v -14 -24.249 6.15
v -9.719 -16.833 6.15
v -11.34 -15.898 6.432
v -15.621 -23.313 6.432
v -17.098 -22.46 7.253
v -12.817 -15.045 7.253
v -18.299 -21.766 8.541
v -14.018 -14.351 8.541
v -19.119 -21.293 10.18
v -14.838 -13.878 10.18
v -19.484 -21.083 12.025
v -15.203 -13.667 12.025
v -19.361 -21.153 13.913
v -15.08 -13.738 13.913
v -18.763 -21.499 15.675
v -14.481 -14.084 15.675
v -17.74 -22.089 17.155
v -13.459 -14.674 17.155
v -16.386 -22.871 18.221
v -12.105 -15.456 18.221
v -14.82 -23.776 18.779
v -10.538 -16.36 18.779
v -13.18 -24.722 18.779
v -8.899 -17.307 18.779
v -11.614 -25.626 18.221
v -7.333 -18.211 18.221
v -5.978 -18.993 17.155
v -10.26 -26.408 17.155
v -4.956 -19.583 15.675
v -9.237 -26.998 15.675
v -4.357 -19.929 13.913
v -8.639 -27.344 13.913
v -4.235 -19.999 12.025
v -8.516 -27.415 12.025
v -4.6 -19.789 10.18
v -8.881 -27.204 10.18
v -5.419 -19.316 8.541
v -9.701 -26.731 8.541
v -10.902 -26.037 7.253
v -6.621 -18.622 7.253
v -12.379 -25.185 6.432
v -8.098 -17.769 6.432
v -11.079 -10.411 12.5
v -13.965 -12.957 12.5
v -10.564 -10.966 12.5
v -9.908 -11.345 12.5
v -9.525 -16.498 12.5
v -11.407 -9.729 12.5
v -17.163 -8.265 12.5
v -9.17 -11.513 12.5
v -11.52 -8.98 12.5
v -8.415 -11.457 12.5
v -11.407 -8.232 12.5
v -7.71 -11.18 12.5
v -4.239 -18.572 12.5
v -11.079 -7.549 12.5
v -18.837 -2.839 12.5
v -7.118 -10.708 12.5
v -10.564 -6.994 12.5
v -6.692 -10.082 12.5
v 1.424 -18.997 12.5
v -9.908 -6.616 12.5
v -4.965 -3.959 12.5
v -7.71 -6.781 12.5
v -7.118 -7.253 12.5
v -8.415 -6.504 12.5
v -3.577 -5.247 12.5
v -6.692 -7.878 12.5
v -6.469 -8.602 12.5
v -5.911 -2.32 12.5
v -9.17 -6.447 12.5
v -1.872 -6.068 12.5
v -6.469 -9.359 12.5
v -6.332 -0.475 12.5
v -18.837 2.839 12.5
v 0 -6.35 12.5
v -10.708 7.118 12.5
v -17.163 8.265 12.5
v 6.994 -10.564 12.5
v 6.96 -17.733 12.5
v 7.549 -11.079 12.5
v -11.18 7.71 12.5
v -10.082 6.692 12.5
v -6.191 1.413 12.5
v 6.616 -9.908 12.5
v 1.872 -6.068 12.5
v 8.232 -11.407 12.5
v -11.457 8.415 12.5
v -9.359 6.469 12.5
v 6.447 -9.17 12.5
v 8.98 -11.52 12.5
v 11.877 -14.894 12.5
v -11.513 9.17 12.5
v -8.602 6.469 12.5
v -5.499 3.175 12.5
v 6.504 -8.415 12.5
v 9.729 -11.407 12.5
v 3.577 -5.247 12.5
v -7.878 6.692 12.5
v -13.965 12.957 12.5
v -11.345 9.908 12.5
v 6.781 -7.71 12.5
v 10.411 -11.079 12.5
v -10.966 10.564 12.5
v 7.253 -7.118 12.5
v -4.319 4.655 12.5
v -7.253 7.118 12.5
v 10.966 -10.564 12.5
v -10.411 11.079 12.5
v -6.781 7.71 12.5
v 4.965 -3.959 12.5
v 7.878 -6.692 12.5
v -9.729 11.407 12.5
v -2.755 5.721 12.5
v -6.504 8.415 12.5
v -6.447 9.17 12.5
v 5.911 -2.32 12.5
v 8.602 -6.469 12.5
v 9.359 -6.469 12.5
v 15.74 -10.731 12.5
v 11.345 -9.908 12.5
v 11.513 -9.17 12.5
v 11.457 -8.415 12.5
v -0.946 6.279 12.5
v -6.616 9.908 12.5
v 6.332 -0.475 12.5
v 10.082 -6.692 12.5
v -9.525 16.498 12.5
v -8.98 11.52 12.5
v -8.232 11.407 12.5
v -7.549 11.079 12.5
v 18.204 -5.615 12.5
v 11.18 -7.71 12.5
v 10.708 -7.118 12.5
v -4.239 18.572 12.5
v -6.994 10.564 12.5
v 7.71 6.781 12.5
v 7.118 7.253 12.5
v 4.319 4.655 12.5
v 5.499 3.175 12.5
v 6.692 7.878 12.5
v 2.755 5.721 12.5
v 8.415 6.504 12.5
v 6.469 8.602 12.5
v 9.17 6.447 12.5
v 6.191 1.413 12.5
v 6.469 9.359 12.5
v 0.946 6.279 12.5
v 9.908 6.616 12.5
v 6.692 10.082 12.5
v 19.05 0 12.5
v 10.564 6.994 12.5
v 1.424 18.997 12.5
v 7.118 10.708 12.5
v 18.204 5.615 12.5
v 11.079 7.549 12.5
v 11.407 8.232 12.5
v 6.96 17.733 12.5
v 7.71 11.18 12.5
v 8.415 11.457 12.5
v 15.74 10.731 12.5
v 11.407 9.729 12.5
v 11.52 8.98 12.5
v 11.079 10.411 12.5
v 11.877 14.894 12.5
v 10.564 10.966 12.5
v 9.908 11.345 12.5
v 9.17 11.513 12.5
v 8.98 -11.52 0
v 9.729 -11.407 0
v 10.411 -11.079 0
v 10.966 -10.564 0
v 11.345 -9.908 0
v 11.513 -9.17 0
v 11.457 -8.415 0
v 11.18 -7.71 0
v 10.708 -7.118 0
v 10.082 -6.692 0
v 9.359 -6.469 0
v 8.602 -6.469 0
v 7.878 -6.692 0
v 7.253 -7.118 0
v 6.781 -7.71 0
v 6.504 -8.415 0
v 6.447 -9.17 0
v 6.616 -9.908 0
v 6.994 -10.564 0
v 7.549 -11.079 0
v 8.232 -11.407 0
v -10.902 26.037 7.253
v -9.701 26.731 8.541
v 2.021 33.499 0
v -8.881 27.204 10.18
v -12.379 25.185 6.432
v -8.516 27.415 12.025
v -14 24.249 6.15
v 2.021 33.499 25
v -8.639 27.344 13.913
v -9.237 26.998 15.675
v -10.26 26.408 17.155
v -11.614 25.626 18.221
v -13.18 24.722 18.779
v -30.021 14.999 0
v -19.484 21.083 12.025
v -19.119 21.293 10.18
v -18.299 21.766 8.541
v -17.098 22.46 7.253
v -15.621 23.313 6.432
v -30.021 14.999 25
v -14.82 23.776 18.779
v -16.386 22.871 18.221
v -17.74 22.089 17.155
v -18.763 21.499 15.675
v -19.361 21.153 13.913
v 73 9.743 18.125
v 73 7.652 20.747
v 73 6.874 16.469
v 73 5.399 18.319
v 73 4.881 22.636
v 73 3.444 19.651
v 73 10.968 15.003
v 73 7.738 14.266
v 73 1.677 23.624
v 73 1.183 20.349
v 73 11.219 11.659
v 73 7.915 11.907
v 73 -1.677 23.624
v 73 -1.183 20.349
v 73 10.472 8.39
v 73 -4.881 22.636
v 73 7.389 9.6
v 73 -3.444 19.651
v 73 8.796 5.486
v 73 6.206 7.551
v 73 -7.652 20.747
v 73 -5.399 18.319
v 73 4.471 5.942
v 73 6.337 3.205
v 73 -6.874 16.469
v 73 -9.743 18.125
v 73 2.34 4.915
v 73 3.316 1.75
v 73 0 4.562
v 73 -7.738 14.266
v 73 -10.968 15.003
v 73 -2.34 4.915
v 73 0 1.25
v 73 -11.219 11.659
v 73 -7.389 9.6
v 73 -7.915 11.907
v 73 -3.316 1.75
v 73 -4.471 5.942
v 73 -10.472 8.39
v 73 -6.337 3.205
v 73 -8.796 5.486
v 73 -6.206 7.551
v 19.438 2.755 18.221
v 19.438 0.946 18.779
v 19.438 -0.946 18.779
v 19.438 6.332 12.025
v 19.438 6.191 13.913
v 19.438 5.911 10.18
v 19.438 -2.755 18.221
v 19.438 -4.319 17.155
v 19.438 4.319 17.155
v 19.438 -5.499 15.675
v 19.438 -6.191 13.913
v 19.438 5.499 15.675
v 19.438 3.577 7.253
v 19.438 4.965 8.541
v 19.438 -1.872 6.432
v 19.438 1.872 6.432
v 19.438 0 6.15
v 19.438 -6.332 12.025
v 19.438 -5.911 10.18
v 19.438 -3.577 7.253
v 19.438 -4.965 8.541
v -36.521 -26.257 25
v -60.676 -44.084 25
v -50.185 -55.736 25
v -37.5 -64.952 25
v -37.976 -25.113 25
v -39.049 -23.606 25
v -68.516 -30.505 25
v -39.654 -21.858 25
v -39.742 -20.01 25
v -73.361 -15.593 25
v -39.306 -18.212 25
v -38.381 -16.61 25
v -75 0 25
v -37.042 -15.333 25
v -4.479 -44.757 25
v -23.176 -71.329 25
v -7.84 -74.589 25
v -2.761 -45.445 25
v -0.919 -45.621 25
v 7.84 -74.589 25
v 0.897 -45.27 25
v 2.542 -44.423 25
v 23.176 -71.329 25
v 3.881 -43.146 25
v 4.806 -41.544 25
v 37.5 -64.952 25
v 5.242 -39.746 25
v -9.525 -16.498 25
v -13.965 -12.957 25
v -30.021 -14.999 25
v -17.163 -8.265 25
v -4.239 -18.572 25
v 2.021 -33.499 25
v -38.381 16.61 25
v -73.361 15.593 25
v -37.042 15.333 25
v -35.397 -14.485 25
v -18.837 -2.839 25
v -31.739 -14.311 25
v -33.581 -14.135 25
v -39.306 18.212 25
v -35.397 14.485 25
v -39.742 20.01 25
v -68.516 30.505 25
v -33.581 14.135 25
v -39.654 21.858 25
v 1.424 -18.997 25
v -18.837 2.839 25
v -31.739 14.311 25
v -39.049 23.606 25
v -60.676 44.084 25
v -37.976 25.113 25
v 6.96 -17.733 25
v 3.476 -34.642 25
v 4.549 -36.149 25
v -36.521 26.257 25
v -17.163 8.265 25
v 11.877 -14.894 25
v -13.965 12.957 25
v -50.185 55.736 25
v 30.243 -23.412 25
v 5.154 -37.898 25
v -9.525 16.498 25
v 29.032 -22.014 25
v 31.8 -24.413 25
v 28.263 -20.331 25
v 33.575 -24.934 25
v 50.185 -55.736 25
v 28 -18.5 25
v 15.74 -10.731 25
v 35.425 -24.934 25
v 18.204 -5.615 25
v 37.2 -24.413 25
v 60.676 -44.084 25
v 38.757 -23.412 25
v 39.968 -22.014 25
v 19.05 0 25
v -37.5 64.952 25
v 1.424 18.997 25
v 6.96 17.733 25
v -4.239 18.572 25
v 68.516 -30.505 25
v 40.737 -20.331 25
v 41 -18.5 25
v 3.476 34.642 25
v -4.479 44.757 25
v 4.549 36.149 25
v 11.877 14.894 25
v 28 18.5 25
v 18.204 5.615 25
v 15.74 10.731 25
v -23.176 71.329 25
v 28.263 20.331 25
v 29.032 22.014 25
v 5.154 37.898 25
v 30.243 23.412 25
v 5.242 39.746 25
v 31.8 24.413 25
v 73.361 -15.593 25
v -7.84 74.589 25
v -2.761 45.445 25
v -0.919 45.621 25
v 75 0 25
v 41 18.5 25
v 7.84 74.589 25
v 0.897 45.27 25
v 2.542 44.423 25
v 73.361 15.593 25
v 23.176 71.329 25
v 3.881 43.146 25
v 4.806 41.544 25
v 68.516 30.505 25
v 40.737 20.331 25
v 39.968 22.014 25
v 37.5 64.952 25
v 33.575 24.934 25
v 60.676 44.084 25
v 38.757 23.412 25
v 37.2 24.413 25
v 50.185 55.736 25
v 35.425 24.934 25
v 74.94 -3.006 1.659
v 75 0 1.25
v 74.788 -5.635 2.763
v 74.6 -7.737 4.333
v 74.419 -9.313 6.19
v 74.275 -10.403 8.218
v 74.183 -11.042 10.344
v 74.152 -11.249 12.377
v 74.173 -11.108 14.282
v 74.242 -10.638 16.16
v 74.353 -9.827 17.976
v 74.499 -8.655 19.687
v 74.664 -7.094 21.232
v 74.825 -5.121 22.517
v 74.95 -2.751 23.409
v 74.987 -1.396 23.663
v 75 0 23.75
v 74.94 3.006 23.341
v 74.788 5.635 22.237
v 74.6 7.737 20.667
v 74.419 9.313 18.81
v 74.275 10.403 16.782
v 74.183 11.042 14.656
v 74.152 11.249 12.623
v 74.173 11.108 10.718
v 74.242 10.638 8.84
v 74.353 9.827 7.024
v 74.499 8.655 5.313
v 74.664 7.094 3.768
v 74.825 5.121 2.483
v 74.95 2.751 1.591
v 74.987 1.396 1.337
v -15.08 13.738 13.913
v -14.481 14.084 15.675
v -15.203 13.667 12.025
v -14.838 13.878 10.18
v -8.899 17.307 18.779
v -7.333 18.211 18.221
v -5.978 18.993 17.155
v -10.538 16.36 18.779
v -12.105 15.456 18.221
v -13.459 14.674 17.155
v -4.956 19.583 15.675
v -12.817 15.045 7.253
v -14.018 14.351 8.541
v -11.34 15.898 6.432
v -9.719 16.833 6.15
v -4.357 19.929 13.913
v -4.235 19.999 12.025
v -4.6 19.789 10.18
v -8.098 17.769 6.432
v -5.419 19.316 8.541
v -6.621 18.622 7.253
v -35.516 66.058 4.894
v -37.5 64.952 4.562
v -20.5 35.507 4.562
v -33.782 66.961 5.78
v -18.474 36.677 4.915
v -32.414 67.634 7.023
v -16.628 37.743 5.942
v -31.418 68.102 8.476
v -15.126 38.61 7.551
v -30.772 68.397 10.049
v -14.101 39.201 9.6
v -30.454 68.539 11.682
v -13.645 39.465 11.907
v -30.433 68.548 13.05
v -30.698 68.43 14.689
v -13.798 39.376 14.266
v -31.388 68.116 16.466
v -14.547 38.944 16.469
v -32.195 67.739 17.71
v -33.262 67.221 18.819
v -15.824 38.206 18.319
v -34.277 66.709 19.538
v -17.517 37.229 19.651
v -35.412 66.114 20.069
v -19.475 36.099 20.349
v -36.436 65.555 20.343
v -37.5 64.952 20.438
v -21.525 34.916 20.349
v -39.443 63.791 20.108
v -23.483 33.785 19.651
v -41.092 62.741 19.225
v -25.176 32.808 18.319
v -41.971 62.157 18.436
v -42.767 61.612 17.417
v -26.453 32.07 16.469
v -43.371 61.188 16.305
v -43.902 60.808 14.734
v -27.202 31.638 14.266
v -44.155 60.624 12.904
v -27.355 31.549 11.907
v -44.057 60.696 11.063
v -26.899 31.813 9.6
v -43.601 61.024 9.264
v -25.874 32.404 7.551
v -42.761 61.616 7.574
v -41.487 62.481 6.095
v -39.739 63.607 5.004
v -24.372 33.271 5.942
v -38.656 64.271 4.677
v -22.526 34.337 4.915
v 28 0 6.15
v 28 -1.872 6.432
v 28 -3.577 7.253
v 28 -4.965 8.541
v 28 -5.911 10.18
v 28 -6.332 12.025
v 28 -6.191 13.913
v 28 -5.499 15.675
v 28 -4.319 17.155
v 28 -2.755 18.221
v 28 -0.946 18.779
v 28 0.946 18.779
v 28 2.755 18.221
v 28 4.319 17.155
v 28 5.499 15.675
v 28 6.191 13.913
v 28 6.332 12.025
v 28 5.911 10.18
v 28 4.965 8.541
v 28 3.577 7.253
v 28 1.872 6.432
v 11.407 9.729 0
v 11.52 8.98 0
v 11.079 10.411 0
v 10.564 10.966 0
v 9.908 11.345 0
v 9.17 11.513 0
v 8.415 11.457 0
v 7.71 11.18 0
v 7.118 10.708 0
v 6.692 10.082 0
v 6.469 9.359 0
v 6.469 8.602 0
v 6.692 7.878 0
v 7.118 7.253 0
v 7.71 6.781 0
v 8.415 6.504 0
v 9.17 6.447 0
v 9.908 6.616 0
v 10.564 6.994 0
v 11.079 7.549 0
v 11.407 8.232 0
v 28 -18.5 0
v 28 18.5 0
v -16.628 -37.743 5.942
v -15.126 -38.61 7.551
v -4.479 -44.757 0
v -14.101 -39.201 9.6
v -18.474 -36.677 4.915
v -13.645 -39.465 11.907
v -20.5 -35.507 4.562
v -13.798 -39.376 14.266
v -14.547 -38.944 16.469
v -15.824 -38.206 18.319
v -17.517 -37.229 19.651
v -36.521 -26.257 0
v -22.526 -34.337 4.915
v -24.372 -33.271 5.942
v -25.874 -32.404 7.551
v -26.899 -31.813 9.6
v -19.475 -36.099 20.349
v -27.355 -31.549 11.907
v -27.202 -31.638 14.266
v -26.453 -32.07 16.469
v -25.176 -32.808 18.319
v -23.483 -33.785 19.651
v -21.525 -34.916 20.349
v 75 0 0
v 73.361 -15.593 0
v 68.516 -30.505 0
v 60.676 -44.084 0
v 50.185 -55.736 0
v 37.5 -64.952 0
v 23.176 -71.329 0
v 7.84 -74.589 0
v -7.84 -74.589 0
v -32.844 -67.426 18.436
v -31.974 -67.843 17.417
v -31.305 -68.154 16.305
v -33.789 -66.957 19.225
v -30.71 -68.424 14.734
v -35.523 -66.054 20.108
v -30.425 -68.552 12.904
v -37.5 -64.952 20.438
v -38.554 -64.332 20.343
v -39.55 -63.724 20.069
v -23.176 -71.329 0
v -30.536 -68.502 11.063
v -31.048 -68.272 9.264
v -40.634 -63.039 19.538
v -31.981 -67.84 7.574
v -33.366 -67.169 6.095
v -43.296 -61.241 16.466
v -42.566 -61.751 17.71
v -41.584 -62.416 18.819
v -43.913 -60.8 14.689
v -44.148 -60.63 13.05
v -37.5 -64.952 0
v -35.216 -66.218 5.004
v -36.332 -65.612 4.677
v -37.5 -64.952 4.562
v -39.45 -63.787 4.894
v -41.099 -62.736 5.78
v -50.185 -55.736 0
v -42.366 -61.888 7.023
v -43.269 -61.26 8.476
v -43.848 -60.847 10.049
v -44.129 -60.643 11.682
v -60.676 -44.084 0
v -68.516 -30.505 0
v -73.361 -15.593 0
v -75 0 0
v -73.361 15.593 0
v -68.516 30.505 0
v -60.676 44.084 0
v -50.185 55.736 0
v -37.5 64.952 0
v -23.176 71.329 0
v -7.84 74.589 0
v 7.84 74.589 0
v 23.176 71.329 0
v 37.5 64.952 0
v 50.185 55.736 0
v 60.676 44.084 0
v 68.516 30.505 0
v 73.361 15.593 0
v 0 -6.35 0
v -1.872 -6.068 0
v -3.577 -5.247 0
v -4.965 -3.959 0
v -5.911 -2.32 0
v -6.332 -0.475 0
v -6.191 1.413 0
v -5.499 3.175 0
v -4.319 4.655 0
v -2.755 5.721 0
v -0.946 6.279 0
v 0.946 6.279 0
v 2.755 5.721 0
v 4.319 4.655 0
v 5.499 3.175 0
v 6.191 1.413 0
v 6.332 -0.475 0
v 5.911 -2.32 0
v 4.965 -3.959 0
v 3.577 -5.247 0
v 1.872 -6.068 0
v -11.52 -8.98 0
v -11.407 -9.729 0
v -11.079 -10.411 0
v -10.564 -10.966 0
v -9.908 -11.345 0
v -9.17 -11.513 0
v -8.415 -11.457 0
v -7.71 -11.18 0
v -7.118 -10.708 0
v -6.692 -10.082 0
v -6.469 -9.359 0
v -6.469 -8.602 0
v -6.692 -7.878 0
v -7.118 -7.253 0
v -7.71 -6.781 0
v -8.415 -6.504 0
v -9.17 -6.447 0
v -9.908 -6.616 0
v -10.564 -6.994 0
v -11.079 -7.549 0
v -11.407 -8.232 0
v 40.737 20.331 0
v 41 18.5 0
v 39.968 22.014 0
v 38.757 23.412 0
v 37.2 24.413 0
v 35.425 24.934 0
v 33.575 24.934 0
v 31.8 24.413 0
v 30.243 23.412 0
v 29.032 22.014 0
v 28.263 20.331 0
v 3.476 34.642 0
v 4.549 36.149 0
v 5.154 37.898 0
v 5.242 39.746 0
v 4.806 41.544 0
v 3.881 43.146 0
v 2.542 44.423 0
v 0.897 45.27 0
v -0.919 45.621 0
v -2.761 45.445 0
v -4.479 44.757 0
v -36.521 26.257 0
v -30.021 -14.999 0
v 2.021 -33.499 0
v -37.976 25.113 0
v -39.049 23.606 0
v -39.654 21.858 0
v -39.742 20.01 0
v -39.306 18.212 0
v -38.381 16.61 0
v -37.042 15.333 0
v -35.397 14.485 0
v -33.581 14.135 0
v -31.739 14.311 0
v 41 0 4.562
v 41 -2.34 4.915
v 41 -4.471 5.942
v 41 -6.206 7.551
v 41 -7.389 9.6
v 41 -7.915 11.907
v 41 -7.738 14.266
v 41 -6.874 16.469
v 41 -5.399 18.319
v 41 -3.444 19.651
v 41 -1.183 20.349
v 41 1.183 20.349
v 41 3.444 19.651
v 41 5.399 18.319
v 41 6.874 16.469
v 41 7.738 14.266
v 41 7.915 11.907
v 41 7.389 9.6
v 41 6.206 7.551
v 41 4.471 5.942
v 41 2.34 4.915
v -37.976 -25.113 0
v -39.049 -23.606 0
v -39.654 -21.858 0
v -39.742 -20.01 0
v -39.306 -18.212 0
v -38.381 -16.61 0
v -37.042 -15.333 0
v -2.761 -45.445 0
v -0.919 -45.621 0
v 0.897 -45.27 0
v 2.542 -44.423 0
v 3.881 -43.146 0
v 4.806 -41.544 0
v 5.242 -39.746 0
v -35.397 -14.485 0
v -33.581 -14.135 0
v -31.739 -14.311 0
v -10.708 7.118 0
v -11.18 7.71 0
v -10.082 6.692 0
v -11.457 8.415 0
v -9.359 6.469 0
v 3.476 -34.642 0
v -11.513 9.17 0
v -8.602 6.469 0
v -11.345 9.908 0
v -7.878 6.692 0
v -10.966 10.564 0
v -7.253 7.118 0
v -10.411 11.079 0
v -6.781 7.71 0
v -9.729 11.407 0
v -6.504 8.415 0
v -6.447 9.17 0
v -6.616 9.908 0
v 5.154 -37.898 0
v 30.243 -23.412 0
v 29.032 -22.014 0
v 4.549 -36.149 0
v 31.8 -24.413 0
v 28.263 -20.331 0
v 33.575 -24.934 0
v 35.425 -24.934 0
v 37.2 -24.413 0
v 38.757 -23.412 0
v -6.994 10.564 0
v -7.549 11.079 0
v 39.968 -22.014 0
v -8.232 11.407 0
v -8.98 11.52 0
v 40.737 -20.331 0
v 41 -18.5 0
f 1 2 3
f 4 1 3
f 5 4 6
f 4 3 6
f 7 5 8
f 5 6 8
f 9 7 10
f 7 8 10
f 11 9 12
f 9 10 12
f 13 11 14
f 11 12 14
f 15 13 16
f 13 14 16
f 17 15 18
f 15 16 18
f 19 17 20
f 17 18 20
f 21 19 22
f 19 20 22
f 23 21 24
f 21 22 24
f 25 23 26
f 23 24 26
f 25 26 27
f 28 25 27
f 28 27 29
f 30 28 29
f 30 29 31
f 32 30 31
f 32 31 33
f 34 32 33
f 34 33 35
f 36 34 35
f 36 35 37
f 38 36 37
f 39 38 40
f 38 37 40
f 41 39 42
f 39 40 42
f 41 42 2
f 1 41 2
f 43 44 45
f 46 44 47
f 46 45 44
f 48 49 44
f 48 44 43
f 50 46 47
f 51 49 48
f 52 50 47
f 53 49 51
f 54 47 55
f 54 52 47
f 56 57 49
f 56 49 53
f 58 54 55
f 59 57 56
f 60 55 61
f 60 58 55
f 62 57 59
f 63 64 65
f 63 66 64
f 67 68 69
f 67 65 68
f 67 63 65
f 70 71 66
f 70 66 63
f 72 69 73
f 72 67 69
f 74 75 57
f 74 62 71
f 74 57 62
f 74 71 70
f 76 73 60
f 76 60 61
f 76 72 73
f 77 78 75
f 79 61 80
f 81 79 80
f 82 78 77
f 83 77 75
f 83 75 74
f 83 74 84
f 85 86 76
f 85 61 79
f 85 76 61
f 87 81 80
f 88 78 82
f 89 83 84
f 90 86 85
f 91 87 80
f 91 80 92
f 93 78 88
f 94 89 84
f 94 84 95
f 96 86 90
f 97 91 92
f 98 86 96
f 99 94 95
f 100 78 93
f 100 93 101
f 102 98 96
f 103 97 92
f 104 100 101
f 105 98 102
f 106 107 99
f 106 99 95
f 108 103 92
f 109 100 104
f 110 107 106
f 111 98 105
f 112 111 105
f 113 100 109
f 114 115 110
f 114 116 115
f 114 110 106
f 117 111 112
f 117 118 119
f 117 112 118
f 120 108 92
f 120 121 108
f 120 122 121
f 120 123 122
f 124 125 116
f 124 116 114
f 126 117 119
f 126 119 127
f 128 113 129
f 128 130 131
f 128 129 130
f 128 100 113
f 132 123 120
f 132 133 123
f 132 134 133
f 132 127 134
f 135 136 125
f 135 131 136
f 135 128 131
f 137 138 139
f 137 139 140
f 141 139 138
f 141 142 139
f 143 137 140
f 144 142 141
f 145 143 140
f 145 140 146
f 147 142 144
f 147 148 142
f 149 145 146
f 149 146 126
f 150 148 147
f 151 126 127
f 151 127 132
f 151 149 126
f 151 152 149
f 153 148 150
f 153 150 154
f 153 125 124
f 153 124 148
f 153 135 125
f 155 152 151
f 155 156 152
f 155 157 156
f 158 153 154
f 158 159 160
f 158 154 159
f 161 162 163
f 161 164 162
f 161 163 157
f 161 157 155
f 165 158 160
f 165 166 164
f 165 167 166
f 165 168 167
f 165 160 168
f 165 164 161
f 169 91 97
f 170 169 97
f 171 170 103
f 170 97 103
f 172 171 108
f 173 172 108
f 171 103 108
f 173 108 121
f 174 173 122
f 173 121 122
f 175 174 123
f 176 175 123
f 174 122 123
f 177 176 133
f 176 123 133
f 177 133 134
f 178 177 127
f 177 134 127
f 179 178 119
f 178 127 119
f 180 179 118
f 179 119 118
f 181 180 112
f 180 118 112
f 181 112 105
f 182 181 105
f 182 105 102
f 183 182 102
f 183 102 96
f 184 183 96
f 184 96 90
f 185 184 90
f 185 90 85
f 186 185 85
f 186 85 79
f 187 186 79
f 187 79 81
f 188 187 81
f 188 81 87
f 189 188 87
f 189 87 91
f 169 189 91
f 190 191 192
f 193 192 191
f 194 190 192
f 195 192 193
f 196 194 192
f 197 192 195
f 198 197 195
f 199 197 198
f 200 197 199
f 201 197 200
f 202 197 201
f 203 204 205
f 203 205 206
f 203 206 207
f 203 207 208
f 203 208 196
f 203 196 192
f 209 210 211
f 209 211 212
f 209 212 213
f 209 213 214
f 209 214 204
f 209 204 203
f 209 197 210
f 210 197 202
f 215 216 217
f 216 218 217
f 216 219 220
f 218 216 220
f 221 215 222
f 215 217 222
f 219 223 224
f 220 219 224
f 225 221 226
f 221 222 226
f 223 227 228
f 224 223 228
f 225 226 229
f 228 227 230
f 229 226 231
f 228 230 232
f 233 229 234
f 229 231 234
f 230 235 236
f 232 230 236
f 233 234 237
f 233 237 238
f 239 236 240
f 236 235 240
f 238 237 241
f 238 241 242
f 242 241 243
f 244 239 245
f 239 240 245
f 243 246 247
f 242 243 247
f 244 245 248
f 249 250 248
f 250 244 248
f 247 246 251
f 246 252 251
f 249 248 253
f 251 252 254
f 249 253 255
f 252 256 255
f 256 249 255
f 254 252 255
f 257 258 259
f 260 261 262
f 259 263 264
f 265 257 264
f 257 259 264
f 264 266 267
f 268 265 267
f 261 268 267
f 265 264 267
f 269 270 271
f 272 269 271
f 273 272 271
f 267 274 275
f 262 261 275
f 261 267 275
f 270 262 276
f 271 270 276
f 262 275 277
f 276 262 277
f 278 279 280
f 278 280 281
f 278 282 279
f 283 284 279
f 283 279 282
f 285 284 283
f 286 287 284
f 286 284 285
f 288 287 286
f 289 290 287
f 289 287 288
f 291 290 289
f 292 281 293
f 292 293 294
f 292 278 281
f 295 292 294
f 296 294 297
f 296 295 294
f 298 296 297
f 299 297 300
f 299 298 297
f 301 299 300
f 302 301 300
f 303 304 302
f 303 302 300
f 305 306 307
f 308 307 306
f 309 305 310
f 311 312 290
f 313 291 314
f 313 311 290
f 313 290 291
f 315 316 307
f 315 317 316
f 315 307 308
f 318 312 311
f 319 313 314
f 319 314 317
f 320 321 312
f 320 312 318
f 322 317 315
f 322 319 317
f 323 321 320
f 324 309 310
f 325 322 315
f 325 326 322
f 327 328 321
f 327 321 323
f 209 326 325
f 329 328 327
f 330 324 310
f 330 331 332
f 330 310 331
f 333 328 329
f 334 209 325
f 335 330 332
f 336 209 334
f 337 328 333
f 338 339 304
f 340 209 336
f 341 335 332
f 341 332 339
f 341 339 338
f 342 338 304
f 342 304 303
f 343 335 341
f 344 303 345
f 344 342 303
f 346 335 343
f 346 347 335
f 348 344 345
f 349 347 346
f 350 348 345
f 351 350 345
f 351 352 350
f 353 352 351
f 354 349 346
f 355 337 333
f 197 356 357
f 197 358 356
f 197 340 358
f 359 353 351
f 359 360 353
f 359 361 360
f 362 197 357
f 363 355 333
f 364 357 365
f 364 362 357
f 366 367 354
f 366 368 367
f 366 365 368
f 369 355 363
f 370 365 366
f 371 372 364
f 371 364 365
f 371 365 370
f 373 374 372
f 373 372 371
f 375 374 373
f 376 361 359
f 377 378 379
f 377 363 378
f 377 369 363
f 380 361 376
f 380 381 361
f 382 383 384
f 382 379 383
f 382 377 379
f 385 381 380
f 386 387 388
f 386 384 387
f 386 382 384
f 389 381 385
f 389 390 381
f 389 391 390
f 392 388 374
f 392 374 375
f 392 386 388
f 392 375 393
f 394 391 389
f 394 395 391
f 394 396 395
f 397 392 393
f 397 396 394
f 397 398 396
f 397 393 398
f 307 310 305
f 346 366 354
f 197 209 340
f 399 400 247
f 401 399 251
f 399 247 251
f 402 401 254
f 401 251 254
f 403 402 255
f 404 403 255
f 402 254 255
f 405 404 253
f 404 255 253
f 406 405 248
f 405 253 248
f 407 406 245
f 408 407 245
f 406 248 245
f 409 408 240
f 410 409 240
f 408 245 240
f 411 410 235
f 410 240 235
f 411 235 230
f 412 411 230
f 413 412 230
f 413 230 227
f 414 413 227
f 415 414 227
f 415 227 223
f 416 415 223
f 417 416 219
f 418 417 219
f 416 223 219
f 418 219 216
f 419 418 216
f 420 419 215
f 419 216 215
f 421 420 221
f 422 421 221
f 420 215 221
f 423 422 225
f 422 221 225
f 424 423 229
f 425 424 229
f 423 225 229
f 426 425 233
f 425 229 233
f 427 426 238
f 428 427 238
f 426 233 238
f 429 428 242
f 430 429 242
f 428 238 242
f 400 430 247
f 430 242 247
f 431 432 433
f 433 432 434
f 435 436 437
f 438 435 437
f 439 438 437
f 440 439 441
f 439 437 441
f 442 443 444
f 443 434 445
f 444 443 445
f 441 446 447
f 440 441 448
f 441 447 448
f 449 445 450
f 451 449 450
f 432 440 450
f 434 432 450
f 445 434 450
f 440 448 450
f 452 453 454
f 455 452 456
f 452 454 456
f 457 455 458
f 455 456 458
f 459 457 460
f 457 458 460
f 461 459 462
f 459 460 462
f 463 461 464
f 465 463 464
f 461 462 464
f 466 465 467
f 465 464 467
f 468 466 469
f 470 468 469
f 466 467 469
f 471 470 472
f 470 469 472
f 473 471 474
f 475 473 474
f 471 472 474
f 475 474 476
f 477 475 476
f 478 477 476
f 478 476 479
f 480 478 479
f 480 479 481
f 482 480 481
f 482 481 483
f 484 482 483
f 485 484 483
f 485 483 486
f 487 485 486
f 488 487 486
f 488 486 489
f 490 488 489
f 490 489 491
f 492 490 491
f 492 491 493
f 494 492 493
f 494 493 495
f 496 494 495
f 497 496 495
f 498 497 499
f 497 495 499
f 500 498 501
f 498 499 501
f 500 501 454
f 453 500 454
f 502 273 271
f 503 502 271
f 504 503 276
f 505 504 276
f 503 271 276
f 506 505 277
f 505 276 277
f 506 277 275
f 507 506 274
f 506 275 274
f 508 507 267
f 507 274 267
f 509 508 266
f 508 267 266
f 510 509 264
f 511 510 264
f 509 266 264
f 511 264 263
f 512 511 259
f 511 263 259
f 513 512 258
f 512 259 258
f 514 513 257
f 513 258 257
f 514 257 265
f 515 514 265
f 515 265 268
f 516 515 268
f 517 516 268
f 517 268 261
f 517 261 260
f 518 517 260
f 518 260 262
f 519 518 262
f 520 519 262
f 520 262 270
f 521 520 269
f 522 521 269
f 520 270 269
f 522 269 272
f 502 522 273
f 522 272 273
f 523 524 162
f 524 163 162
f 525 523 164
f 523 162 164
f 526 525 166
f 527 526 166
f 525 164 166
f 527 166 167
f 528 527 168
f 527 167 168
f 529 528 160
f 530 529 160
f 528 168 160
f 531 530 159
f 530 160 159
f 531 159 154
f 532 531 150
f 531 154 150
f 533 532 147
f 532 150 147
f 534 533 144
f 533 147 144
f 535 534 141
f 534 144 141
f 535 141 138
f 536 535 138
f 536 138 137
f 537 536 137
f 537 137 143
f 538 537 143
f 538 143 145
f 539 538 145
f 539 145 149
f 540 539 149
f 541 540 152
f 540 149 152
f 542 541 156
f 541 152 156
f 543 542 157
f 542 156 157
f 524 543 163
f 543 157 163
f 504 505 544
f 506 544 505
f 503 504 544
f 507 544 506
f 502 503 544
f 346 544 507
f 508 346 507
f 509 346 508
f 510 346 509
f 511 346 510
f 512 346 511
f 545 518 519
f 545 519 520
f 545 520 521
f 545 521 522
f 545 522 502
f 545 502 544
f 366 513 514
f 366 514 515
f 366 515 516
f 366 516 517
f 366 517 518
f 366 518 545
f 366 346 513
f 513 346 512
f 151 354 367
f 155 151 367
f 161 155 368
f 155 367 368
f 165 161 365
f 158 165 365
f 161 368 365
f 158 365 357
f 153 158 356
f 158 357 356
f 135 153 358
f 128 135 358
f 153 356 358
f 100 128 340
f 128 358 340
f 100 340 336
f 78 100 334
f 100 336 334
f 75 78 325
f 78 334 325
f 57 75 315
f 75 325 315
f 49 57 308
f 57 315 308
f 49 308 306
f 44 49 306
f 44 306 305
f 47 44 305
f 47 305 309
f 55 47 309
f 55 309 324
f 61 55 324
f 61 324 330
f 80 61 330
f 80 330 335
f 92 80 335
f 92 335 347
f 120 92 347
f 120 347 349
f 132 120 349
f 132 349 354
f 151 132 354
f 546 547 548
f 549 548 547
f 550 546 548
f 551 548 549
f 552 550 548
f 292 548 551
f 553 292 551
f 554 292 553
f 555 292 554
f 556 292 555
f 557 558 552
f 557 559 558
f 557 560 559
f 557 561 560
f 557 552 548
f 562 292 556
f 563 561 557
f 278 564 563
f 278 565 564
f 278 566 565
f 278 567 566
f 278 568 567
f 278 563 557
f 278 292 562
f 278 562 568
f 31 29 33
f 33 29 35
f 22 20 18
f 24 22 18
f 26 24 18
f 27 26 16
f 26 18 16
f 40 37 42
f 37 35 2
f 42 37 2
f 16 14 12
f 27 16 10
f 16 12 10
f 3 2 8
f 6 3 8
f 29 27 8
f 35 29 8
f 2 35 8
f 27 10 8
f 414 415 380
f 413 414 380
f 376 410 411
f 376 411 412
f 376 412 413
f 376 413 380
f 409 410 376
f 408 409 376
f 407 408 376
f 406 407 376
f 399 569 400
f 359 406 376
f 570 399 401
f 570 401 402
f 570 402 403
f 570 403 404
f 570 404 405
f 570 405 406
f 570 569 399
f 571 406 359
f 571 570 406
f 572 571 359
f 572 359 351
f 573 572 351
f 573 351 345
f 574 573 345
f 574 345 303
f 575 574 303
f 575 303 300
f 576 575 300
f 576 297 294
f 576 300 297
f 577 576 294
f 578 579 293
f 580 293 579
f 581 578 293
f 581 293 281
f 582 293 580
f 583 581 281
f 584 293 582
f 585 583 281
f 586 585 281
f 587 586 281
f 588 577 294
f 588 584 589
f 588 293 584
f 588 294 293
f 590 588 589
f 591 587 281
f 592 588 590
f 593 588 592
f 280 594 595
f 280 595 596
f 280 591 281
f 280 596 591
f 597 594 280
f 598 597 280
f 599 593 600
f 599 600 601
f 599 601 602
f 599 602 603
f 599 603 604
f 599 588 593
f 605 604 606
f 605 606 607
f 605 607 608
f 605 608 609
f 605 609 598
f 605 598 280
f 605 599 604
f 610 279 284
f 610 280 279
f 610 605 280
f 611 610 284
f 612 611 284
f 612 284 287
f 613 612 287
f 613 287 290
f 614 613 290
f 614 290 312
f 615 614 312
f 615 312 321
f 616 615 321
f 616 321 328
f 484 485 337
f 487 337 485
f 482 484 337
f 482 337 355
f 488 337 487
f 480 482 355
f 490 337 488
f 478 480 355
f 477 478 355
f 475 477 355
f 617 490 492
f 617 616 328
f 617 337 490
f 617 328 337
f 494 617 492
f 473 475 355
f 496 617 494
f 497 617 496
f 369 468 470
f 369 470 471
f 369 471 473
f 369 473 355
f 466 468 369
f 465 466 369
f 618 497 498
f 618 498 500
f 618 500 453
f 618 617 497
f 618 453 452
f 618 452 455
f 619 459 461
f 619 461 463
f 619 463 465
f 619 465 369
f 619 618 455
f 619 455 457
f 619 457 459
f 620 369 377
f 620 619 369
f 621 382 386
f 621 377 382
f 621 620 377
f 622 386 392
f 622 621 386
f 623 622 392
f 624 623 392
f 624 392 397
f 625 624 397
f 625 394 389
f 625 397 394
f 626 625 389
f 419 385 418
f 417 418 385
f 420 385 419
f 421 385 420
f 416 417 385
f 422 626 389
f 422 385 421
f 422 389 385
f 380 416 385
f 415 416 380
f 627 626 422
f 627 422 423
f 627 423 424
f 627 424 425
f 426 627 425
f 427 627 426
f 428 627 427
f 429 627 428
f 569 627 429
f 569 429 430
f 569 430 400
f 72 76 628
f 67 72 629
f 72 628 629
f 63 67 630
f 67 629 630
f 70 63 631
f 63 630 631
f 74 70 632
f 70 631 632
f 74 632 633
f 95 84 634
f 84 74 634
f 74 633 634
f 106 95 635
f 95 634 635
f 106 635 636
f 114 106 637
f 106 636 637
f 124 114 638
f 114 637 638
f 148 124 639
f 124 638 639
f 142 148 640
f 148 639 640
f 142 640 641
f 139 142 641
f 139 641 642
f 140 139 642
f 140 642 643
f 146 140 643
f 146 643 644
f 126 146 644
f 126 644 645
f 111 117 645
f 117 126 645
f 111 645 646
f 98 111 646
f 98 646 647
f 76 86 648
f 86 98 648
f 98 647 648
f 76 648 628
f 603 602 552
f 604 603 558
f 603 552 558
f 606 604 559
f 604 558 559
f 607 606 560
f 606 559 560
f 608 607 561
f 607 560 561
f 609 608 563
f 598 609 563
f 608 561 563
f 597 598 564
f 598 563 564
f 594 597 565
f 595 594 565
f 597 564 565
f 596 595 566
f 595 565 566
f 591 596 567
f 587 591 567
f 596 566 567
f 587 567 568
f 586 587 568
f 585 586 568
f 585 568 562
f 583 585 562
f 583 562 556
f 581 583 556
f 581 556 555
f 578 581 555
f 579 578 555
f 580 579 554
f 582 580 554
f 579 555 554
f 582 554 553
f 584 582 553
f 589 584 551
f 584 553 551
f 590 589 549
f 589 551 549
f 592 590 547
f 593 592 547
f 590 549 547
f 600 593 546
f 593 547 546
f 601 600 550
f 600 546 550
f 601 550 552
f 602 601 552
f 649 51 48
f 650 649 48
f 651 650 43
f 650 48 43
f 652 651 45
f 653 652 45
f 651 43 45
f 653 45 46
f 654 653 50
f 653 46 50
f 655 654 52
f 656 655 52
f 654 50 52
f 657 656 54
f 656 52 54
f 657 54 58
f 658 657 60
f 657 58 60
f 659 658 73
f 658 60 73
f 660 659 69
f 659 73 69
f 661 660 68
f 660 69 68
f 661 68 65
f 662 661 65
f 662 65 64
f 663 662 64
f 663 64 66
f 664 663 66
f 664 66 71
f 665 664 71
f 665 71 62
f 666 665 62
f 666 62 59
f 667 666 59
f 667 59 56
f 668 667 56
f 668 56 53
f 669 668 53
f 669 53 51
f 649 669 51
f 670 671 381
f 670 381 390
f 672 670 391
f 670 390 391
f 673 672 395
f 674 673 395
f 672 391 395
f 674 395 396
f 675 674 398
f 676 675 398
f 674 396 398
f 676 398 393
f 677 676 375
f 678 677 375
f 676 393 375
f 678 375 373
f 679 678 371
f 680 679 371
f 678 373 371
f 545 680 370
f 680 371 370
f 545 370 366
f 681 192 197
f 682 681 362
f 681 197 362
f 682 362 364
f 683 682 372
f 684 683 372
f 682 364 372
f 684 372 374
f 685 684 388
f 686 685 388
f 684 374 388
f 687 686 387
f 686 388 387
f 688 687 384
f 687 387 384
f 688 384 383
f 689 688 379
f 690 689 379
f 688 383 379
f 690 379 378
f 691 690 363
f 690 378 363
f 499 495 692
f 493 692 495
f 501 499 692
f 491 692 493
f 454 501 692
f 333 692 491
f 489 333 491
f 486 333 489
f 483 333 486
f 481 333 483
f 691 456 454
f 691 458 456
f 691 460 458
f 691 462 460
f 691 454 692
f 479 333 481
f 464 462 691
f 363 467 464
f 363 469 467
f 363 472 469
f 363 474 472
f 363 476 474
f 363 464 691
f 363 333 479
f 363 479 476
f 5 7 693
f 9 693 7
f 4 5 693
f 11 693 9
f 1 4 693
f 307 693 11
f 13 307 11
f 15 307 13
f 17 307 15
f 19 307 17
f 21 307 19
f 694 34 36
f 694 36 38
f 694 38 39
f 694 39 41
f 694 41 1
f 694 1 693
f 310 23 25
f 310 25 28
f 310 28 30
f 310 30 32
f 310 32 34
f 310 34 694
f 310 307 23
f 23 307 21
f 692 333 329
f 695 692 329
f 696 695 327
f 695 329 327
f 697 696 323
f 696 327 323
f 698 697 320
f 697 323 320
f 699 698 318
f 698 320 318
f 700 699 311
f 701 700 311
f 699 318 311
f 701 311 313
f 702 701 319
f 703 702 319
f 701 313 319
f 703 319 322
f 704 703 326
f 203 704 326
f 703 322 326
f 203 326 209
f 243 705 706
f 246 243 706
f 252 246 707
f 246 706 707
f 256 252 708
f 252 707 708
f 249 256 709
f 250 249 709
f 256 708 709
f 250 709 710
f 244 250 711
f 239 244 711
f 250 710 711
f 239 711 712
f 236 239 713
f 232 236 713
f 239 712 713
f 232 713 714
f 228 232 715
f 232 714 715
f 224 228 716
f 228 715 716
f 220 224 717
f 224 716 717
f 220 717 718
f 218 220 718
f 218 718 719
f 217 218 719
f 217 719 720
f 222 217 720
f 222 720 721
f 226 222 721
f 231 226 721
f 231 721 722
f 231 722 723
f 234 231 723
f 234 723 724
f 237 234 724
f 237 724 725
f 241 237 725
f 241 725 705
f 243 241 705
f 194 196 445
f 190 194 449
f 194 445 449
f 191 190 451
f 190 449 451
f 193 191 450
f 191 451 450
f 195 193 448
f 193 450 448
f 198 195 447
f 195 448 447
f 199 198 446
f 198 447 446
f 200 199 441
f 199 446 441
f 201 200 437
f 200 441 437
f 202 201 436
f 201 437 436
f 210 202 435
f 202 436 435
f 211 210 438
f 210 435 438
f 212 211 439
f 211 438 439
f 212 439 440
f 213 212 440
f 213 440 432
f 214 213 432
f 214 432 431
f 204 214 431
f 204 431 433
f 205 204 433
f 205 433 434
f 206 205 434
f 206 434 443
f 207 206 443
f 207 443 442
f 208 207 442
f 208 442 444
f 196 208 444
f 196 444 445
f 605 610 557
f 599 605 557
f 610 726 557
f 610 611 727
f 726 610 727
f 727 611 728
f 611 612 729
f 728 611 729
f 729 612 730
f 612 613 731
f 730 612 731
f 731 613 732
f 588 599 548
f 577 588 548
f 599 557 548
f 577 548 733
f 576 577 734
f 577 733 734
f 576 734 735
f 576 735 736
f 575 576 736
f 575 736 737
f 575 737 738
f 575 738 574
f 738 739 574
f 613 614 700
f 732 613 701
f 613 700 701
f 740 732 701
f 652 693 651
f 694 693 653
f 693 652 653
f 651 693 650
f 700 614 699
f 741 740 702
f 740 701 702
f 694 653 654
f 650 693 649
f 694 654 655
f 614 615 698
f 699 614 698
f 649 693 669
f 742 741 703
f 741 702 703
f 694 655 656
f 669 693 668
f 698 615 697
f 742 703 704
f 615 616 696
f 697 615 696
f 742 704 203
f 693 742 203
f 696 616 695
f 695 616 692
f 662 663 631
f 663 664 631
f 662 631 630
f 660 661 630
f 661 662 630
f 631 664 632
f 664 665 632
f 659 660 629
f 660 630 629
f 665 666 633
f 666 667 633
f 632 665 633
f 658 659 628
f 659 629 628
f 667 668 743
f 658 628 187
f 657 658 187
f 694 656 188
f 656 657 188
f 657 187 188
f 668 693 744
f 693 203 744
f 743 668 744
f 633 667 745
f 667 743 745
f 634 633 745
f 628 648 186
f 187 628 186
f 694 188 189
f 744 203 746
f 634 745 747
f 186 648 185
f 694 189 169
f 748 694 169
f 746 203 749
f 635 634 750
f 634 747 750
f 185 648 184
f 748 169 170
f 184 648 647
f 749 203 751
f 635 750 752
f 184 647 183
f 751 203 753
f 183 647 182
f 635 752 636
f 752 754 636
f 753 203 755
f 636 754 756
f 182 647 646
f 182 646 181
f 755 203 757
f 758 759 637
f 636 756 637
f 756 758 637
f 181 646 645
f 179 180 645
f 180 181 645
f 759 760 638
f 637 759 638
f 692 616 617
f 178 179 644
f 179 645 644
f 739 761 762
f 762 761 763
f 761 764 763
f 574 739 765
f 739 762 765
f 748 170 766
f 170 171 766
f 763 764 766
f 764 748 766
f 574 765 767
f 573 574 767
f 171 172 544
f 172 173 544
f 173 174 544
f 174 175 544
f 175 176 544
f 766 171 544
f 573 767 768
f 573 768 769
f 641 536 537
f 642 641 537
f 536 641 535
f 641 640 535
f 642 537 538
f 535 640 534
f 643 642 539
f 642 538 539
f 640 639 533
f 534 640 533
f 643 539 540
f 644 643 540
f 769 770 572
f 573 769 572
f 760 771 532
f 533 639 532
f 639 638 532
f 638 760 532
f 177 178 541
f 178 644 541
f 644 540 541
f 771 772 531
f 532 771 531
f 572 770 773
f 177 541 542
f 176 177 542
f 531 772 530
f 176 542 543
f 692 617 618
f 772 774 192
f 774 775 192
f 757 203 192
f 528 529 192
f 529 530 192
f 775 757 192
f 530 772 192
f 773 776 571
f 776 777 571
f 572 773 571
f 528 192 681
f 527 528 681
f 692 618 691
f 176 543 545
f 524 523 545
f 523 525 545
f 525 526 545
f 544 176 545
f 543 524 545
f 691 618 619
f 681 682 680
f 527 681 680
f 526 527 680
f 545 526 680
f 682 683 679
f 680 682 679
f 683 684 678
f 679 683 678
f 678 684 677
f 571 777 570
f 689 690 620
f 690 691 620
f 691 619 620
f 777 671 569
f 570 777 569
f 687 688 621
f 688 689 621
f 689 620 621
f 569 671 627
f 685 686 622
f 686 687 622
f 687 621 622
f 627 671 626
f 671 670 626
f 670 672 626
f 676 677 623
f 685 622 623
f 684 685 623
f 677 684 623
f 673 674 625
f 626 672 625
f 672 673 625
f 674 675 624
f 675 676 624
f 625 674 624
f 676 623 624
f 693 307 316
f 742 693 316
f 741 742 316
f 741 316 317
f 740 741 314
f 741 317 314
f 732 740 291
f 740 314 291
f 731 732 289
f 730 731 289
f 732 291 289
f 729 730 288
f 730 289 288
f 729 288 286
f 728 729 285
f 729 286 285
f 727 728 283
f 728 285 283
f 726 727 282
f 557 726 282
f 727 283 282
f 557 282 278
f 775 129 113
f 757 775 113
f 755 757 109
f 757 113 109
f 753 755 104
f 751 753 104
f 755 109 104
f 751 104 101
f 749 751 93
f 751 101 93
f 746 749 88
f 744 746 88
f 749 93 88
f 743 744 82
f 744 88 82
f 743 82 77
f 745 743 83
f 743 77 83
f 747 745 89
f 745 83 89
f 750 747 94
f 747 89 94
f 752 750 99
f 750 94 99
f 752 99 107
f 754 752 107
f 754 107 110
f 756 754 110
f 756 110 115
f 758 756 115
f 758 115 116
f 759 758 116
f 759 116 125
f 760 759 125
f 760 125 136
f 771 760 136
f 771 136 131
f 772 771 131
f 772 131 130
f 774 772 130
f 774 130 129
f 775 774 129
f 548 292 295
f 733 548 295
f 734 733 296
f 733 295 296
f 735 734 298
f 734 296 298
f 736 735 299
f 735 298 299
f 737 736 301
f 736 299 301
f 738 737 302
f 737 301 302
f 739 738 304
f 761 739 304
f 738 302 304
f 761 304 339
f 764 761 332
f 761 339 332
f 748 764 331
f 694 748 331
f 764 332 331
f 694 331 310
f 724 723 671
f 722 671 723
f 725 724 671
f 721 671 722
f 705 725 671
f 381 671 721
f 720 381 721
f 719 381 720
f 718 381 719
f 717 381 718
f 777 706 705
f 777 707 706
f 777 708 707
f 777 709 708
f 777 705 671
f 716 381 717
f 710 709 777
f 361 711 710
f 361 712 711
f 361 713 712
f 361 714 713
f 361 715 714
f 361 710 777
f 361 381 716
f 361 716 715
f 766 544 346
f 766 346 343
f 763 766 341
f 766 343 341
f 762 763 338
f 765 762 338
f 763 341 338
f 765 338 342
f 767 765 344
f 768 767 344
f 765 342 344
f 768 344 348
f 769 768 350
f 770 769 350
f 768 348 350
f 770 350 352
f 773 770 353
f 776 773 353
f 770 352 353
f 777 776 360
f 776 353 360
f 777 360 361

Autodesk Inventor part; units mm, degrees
ref_plane "XZ Plane" through (0, 0, 0) normal (0, 1, 0) x (-1, 0, 0)
ref_plane "XY Plane" through (0, 0, 0) normal (0, 0, 1) x (1, 0, 0)
sketch "Sketch1" plane through (0, 0, 0) normal (0, 0, 1) x (1, 0, 0)
  circle A0 centre (0, 0) radius 75
  dimension "d114" = 150
extrude "Extrusion1" add sketch "Sketch1" along normal blind 25
ref_plane "HoleTangent" through (75, 0, 0) normal (1, 0, 0) x (0, 1, 0)
sketch "Sketch3" plane through (0, 0, 25) normal (0, 0, 1) x (1, 0, 0)
  point P0 (0, 0)
  point P1 (0, 0)
hole "Hole1" at (0, 0, 25) direction (0, 0, -1) diameter 12.7 end through all
sketch "Sketch6" plane through (0, 0, 25) normal (0, 0, 1) x (1, 0, 0)
  circle A0 centre (0, 0) radius 6.35 projected
  circle A1 centre (0, 0) radius 19.05
  dimension "d46" = 38.1
extrude "Extrusion4" cut sketch "Sketch6" against normal blind 12.5
sketch "Sketch7" plane through (0, 0, 0) normal (0, 0, -1) x (-1, 0, 0)
  circle A0 centre (0, 0) radius 6.35 projected
  circle A1 centre (0, 0) radius 12.7 construction
  line L0 (0, 0) -> (8.9803, 8.9803) construction
  line L1 (0, 0) -> (11.1003, 0) construction
  dimension "d49" = 25.4
  dimension "d50" = 45
hole "Hole3" at (-8.9803, 8.9803, 0) direction (0, 0, 1) diameter 5.08 end through all
pattern_circular "Circular Pattern3" count 4 over 360 about axis through (0, 0, -188.6001) along (0, 0, 1) of "Hole3"
sketch "Sketch5" plane through (75, 12.7, 25.4) normal (1, 0, 0) x (0, 0, -1)
  line L0 (30.48, -12.7) -> (-5.08, -12.7) projected
  point P0 (12.9, -12.7)
  point P1 (25.4, -12.7)
  dimension "d116" = 12.5
hole "Hole2" at (75, 0, 12.5) direction (-1, 0, 0) diameter 12.7 depth 55.5625 counterbore diameter 15.875 counterbore depth 34.925
sketch "Sketch4" plane through (0, 0, 25) normal (0, 0, 1) x (1, 0, 0)
  line L0 (41, 18.5) -> (41, -18.5)
  line L1 (28, -18.5) -> (28, 18.5)
  arc A0 (41, 18.5) -> (28, 18.5) centre (34.5, 18.5) ccw
  arc A1 (28, -18.5) -> (41, -18.5) centre (34.5, -18.5) ccw
  circle A2 centre (0, 0) radius 19.05 projected
  point P0 (28, 0)
  dimension "d22" = 50
  dimension "d24" = 6.5
  dimension "d62" = 34.5
extrude "Extrusion3" cut sketch "Sketch4" against normal through all contours L0 A1 L1 A0
pattern_circular "Circular Pattern2" count 3 over 360 about axis through (0, 0, -188.6001) along (0, 0, 1) of "Hole2", "Extrusion3"
sketch "Sketch8" plane through (0, 0, 25) normal (0, 0, 1) x (1, 0, 0)
  line L0 (-10.3502, -47.1424) -> (10.8733, -47.1424) construction
  line L1 (10.8733, -47.1424) -> (10.8733, -60.9041) construction
  line L2 (10.8733, -60.9041) -> (-10.3502, -60.9041) construction
  line L3 (-10.3502, -60.9041) -> (-10.3502, -47.1424) construction
  point P0 (0, 0)
hole "Hole4" at (75, 0, 12.5) direction (-1, 0, 0) diameter 22.5 depth 2
equation "\"d116\" = 0.5 * d2"
equation "\"d115\" = 0.5 * d114"
equation "\"d2\" = 25"
properties part number "PWTR-0032" material "Aluminum-6061"
